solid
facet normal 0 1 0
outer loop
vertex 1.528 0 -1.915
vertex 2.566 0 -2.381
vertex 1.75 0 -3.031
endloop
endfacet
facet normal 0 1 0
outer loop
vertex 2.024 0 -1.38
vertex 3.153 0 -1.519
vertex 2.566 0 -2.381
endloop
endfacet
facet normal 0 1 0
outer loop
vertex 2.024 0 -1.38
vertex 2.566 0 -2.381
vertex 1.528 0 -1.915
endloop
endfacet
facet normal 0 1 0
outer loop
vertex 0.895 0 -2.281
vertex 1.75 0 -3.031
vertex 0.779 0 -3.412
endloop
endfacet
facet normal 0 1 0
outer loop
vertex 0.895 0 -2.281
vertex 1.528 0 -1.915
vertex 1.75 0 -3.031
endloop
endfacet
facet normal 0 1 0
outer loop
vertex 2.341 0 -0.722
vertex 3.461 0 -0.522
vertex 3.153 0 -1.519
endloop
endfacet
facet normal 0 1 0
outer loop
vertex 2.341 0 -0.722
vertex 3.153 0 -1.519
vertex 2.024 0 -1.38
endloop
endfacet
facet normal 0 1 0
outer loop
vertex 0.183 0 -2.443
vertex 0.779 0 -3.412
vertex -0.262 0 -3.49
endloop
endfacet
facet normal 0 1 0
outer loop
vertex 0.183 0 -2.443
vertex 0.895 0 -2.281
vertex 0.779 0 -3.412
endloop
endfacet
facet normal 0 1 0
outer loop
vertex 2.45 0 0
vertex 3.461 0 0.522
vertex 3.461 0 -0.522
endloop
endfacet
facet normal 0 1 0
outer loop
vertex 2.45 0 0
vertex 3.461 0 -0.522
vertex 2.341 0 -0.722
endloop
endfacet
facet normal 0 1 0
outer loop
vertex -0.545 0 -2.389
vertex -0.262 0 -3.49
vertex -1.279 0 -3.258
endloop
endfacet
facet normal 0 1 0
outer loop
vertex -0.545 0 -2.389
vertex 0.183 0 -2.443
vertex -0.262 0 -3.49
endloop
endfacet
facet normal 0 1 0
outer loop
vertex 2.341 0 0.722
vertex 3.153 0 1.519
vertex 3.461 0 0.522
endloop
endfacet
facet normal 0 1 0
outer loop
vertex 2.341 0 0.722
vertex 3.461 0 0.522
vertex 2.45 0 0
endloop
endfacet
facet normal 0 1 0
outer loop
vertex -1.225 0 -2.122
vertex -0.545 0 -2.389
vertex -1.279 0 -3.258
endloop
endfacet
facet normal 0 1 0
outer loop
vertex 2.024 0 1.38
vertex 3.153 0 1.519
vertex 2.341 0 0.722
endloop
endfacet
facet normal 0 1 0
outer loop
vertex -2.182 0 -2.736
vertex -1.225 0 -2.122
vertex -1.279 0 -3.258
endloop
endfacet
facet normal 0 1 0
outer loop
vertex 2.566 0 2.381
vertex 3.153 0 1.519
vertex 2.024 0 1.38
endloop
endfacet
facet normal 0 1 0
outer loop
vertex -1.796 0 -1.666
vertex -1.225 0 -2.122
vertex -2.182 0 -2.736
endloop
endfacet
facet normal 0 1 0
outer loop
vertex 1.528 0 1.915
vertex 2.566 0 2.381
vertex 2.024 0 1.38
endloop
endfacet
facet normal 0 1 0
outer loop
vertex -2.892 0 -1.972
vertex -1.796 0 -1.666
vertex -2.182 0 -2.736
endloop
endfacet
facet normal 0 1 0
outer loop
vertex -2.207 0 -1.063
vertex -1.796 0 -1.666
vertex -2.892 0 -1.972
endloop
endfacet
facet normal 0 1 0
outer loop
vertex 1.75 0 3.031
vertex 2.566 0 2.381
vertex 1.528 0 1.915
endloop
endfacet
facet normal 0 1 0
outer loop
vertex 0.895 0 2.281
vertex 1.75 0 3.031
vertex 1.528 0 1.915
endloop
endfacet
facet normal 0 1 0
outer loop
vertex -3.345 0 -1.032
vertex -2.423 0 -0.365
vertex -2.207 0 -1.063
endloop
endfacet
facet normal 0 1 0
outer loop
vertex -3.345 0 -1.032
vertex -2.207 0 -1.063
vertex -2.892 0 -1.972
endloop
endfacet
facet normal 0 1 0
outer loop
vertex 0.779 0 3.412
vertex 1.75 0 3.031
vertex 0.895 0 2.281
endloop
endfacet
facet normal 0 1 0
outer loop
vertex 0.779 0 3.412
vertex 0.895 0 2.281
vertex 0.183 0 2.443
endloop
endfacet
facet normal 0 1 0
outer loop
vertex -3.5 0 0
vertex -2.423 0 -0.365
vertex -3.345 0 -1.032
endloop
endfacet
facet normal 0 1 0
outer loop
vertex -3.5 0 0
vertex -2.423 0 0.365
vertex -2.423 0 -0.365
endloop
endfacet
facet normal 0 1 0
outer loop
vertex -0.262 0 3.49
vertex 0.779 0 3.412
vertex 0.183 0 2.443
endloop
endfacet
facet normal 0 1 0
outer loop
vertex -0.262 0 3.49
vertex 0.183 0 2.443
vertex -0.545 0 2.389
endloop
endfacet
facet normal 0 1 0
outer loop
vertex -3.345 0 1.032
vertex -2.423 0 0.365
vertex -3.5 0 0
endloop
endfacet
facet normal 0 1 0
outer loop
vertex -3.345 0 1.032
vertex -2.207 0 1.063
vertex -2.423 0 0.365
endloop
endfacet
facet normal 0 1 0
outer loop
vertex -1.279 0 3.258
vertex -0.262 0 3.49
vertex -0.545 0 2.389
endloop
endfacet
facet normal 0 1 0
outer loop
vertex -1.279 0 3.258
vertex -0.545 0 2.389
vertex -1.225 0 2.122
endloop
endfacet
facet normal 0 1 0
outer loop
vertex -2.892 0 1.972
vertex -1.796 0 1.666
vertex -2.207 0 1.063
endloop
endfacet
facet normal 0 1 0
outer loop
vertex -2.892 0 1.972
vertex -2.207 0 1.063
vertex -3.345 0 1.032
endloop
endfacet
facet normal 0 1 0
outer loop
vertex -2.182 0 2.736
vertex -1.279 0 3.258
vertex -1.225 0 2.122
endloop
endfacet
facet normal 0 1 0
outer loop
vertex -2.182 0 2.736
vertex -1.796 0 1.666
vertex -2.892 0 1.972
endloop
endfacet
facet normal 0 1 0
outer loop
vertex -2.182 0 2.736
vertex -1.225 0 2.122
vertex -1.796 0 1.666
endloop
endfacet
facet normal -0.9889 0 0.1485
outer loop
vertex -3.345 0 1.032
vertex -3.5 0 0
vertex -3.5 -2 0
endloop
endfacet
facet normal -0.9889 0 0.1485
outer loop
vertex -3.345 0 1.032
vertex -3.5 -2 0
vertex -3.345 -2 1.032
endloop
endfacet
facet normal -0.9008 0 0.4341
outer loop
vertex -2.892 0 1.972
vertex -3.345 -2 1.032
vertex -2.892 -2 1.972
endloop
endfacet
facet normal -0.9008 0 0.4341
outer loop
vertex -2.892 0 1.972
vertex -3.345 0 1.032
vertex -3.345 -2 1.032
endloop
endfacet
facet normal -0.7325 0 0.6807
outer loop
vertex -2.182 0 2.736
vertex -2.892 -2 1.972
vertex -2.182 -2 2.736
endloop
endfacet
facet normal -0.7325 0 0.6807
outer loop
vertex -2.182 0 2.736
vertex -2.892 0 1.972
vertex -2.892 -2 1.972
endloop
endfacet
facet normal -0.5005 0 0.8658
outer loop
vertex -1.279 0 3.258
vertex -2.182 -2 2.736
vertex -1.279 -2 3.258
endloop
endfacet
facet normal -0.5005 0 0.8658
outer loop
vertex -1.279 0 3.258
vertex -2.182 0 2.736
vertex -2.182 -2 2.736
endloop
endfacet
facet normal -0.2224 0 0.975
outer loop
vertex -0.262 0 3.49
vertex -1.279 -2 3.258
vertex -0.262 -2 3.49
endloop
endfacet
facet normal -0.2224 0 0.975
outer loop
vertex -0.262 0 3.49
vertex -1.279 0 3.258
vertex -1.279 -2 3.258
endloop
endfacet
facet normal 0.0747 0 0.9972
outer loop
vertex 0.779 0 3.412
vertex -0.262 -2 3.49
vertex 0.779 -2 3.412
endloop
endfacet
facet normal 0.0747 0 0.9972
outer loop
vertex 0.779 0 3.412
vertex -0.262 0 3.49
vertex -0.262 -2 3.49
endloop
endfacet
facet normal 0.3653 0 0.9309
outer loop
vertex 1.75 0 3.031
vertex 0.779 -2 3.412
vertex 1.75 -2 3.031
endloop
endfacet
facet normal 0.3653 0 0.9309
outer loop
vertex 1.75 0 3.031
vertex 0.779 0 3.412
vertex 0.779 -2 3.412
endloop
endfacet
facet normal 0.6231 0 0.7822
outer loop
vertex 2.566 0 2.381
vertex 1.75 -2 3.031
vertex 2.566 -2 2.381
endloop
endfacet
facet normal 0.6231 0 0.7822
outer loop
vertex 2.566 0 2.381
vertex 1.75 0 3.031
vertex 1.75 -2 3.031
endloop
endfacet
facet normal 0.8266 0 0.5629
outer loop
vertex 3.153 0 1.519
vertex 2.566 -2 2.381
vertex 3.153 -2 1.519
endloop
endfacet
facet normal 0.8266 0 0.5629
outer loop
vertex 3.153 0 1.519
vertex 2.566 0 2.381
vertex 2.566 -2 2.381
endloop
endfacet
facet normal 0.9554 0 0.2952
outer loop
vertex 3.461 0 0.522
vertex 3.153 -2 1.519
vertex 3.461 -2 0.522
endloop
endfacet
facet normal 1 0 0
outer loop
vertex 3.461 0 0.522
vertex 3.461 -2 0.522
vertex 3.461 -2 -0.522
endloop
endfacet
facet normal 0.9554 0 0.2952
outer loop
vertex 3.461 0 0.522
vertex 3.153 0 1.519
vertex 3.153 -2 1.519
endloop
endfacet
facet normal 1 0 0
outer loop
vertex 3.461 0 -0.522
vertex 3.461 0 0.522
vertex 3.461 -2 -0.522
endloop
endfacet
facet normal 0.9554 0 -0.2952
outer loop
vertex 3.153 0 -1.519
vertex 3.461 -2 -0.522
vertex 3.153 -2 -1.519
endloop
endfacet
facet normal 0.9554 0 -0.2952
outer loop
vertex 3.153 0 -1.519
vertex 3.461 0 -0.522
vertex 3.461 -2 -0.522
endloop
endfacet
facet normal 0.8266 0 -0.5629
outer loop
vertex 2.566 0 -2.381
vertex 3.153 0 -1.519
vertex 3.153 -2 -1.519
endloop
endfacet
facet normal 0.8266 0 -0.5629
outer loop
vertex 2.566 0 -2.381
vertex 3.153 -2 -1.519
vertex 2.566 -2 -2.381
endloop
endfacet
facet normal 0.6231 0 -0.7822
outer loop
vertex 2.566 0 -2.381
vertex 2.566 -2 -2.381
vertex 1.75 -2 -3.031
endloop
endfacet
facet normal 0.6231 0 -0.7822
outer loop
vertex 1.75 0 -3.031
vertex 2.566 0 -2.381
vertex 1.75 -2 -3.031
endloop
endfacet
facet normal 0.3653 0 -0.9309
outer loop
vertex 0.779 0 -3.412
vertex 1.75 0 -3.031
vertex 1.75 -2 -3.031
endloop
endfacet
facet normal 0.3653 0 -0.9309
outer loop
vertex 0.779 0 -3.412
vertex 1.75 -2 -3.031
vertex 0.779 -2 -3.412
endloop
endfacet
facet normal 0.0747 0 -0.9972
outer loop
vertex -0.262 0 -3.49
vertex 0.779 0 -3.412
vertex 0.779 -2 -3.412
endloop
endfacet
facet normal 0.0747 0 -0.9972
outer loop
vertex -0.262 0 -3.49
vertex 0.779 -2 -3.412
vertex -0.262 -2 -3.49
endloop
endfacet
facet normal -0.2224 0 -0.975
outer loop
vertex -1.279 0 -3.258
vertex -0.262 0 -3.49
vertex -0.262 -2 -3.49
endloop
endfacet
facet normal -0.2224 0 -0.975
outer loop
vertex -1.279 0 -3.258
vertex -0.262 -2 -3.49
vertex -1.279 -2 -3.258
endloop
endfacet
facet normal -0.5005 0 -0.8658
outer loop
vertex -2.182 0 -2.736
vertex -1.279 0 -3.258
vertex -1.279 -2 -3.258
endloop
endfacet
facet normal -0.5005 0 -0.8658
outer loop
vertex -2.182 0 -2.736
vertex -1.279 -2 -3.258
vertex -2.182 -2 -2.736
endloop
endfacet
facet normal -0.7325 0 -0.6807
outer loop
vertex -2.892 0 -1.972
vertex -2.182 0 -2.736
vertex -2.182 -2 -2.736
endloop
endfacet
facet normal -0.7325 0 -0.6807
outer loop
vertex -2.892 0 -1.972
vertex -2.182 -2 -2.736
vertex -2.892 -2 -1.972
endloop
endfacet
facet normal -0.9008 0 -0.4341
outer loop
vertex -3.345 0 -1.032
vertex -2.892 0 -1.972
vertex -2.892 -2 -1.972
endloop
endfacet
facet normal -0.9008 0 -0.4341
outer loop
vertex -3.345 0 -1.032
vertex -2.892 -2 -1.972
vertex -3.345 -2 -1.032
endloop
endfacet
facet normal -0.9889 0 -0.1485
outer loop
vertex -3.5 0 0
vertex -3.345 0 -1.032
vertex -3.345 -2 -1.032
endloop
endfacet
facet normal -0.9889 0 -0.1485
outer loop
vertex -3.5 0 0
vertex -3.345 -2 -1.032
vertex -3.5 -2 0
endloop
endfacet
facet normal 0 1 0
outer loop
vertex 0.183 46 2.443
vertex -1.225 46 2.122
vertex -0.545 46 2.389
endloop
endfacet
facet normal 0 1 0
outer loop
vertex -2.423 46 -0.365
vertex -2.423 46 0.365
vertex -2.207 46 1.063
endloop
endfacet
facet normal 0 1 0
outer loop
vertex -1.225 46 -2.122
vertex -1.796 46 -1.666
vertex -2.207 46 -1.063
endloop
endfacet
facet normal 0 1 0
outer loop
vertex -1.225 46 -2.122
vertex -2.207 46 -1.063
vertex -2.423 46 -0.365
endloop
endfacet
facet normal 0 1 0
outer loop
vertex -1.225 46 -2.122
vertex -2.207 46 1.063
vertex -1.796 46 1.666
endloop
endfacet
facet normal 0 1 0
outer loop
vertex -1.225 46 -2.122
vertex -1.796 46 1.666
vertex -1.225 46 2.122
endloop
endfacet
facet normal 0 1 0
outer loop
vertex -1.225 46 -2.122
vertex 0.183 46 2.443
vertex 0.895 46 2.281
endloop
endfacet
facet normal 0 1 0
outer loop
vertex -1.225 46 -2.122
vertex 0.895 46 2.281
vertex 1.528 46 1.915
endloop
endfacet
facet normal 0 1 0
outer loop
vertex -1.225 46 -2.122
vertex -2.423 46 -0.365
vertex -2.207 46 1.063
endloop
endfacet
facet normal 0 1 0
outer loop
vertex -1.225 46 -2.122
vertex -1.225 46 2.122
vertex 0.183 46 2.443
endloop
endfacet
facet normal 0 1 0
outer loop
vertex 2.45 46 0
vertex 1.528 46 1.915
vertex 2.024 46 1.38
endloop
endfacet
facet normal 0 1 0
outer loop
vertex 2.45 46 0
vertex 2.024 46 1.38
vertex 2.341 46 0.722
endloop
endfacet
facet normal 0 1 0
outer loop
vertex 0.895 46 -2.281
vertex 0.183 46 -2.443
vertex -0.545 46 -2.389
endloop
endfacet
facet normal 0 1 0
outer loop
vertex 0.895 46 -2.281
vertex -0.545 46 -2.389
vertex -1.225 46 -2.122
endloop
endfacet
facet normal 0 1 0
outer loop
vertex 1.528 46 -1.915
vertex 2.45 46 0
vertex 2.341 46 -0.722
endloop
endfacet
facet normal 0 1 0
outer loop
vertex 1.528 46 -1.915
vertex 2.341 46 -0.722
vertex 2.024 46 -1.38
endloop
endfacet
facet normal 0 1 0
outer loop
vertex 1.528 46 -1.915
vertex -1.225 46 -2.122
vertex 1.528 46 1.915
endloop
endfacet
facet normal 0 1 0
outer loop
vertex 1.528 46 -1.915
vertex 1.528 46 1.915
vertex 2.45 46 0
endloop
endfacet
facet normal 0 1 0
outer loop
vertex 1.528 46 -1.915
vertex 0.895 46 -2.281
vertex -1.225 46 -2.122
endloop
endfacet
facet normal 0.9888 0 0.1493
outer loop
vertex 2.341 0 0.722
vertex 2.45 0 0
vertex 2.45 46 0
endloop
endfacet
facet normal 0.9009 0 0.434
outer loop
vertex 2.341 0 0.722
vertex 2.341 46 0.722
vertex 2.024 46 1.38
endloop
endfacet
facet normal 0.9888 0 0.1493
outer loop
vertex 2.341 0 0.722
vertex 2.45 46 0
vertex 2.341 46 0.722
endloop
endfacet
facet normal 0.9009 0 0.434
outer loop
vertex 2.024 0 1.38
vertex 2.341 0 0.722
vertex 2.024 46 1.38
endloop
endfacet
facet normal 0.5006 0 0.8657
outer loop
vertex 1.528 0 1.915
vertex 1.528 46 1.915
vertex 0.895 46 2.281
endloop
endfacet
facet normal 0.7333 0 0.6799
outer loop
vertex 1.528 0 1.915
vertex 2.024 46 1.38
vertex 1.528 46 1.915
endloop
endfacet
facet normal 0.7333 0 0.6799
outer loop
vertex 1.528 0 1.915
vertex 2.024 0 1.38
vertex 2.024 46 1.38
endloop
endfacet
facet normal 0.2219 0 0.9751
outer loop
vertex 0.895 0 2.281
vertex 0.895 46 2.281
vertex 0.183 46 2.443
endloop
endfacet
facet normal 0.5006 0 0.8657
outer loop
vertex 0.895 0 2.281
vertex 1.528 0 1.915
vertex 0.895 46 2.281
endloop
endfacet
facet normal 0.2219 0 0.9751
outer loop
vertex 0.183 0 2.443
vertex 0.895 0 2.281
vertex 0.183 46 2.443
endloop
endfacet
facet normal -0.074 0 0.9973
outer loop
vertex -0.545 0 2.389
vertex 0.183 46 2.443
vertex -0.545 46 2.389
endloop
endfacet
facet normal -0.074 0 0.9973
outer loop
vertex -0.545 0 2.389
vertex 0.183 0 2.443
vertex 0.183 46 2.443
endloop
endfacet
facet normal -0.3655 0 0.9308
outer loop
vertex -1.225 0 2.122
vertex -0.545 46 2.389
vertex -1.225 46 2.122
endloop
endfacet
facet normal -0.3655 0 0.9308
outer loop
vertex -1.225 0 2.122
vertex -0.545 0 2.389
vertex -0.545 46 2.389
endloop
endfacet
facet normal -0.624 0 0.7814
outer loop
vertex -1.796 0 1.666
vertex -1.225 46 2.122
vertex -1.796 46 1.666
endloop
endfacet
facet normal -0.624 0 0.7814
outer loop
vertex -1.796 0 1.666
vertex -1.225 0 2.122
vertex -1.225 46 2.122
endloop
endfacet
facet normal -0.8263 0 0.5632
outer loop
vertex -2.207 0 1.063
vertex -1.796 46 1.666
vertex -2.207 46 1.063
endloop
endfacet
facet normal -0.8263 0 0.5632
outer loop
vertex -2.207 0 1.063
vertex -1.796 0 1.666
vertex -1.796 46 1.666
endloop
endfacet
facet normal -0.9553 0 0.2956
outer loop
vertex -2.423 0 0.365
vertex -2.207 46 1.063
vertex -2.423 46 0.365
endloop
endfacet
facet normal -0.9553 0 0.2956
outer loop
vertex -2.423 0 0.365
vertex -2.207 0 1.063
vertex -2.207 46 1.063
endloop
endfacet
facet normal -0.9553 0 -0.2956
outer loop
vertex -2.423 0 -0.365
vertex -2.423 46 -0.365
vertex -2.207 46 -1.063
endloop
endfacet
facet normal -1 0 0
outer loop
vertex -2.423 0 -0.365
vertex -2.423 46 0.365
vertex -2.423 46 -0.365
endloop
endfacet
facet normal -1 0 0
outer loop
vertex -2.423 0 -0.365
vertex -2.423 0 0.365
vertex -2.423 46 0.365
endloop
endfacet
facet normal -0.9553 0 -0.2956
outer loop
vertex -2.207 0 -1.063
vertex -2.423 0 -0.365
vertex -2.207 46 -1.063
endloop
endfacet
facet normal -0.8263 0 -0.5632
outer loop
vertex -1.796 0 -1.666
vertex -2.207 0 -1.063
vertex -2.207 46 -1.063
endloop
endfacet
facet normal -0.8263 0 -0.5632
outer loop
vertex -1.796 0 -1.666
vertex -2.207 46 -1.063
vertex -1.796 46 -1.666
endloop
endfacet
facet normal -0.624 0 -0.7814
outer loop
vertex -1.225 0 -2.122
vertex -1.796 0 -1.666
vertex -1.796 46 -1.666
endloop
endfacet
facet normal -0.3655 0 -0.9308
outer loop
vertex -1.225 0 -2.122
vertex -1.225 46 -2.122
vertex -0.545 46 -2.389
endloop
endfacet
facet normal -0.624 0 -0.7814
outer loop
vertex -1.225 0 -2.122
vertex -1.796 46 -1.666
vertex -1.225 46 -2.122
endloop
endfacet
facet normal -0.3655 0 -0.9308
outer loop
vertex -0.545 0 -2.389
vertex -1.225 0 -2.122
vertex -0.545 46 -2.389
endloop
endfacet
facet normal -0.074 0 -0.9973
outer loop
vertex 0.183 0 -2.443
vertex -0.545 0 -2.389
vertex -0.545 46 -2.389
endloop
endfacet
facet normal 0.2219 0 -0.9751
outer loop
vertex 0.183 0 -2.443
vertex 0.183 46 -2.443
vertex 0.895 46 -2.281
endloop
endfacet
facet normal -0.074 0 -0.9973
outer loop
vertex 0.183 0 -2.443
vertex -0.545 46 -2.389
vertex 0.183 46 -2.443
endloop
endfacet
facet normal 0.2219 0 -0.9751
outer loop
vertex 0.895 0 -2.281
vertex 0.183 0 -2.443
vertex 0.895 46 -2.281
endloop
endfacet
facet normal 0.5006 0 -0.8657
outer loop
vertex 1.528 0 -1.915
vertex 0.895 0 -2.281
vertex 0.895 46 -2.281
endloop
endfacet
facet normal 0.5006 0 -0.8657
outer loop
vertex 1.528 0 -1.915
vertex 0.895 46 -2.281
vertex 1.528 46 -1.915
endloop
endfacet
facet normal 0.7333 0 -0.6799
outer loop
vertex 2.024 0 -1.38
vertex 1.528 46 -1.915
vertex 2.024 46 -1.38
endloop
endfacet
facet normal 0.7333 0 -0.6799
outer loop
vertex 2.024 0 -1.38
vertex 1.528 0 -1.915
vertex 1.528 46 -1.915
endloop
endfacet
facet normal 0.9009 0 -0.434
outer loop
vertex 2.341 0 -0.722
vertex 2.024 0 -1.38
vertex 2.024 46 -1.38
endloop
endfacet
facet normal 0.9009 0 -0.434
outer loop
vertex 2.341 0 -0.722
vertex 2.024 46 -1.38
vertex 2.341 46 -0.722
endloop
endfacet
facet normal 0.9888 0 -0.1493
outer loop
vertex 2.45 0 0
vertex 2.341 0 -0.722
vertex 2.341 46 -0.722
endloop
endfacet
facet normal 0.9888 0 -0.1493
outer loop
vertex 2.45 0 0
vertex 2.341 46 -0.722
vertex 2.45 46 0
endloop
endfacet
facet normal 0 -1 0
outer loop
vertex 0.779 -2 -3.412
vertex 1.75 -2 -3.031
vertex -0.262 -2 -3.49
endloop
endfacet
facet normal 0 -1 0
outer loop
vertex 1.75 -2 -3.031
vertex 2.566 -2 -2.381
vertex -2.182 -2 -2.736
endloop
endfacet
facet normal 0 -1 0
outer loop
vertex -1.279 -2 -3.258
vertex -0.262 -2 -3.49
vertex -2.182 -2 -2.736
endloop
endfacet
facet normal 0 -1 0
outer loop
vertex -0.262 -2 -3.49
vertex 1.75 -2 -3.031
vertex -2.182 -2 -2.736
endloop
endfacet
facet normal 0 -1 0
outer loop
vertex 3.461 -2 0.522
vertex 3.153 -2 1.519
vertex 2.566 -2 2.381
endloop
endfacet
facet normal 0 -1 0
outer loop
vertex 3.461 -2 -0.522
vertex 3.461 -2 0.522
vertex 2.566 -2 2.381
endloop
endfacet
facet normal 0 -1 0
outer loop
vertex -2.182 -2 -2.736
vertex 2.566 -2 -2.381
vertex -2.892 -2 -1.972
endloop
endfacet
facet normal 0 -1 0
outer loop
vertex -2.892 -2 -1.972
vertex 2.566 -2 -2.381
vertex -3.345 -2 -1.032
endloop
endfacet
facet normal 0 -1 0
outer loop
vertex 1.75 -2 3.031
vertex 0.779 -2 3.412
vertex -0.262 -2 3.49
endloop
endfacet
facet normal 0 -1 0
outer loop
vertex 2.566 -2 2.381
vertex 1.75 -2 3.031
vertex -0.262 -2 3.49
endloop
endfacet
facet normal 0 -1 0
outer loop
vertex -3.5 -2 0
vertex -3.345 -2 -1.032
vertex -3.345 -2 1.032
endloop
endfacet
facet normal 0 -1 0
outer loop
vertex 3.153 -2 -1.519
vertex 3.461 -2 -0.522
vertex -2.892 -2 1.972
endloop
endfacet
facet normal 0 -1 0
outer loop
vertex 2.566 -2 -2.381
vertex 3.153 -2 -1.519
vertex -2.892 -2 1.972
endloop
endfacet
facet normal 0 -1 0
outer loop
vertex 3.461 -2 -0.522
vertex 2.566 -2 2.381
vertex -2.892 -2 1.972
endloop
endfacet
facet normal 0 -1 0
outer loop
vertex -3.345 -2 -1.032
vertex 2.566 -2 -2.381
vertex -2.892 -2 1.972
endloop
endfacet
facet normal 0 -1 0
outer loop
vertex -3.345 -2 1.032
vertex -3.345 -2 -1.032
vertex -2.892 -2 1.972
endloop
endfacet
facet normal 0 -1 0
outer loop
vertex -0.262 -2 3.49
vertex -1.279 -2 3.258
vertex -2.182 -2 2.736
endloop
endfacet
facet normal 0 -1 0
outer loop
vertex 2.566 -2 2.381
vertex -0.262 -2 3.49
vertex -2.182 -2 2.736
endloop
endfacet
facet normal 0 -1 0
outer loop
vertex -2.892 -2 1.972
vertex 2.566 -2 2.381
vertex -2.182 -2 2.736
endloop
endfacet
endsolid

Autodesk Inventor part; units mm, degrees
ref_plane "YZ Plane" through (0, 0, 0) normal (1, 0, 0) x (0, 1, 0)
ref_plane "XZ Plane" through (0, 0, 0) normal (0, 1, 0) x (-1, 0, 0)
ref_plane "XY Plane" through (0, 0, 0) normal (0, 0, 1) x (1, 0, 0)
sketch "Boceto1" plane through (0, 0, 0) normal (0, 1, 0) x (-1, 0, 0)
  circle A0 centre (0, 0) radius 3.5
extrude "Extrusión1" add sketch "Boceto1" against normal blind 2
sketch "Boceto2" plane through (0, 0, 0) normal (0, 1, 0) x (1, 0, 0)
  circle A0 centre (0, 0) radius 2.45
extrude "Extrusión2" add sketch "Boceto2" along normal blind 70
thread "Rosca1" size "M5x0.8" class "6g" standard "ANSI Metric M Profile" length 70
sketch "Boceto3" plane through (0, 70, 0) normal (0, 1, 0) x (1, 0, 0)
  circle A0 centre (0, 0) radius 2.5
  dimension "d8" = 5
extrude "Extrusión3" cut sketch "Boceto3" against normal blind 25
sketch "Boceto4" plane through (0, 45, 0) normal (0, 1, 0) x (1, 0, 0)
  circle A0 centre (0, 0) radius 2.45
extrude "Extrusión4" add sketch "Boceto4" along normal blind 12
sketch "Boceto5" plane through (0, 57, 0) normal (0, 1, 0) x (1, 0, 0)
  circle A0 centre (0, 0) radius 2.45
extrude "Extrusión5" add sketch "Boceto5" along normal blind 12
sketch "Boceto6" plane through (0, 69, 0) normal (0, 1, 0) x (1, 0, 0)
  circle A0 centre (0, 0) radius 2.45
extrude "Extrusión6" cut sketch "Boceto6" against normal blind 23
properties part number "Tornillo_Corto"
